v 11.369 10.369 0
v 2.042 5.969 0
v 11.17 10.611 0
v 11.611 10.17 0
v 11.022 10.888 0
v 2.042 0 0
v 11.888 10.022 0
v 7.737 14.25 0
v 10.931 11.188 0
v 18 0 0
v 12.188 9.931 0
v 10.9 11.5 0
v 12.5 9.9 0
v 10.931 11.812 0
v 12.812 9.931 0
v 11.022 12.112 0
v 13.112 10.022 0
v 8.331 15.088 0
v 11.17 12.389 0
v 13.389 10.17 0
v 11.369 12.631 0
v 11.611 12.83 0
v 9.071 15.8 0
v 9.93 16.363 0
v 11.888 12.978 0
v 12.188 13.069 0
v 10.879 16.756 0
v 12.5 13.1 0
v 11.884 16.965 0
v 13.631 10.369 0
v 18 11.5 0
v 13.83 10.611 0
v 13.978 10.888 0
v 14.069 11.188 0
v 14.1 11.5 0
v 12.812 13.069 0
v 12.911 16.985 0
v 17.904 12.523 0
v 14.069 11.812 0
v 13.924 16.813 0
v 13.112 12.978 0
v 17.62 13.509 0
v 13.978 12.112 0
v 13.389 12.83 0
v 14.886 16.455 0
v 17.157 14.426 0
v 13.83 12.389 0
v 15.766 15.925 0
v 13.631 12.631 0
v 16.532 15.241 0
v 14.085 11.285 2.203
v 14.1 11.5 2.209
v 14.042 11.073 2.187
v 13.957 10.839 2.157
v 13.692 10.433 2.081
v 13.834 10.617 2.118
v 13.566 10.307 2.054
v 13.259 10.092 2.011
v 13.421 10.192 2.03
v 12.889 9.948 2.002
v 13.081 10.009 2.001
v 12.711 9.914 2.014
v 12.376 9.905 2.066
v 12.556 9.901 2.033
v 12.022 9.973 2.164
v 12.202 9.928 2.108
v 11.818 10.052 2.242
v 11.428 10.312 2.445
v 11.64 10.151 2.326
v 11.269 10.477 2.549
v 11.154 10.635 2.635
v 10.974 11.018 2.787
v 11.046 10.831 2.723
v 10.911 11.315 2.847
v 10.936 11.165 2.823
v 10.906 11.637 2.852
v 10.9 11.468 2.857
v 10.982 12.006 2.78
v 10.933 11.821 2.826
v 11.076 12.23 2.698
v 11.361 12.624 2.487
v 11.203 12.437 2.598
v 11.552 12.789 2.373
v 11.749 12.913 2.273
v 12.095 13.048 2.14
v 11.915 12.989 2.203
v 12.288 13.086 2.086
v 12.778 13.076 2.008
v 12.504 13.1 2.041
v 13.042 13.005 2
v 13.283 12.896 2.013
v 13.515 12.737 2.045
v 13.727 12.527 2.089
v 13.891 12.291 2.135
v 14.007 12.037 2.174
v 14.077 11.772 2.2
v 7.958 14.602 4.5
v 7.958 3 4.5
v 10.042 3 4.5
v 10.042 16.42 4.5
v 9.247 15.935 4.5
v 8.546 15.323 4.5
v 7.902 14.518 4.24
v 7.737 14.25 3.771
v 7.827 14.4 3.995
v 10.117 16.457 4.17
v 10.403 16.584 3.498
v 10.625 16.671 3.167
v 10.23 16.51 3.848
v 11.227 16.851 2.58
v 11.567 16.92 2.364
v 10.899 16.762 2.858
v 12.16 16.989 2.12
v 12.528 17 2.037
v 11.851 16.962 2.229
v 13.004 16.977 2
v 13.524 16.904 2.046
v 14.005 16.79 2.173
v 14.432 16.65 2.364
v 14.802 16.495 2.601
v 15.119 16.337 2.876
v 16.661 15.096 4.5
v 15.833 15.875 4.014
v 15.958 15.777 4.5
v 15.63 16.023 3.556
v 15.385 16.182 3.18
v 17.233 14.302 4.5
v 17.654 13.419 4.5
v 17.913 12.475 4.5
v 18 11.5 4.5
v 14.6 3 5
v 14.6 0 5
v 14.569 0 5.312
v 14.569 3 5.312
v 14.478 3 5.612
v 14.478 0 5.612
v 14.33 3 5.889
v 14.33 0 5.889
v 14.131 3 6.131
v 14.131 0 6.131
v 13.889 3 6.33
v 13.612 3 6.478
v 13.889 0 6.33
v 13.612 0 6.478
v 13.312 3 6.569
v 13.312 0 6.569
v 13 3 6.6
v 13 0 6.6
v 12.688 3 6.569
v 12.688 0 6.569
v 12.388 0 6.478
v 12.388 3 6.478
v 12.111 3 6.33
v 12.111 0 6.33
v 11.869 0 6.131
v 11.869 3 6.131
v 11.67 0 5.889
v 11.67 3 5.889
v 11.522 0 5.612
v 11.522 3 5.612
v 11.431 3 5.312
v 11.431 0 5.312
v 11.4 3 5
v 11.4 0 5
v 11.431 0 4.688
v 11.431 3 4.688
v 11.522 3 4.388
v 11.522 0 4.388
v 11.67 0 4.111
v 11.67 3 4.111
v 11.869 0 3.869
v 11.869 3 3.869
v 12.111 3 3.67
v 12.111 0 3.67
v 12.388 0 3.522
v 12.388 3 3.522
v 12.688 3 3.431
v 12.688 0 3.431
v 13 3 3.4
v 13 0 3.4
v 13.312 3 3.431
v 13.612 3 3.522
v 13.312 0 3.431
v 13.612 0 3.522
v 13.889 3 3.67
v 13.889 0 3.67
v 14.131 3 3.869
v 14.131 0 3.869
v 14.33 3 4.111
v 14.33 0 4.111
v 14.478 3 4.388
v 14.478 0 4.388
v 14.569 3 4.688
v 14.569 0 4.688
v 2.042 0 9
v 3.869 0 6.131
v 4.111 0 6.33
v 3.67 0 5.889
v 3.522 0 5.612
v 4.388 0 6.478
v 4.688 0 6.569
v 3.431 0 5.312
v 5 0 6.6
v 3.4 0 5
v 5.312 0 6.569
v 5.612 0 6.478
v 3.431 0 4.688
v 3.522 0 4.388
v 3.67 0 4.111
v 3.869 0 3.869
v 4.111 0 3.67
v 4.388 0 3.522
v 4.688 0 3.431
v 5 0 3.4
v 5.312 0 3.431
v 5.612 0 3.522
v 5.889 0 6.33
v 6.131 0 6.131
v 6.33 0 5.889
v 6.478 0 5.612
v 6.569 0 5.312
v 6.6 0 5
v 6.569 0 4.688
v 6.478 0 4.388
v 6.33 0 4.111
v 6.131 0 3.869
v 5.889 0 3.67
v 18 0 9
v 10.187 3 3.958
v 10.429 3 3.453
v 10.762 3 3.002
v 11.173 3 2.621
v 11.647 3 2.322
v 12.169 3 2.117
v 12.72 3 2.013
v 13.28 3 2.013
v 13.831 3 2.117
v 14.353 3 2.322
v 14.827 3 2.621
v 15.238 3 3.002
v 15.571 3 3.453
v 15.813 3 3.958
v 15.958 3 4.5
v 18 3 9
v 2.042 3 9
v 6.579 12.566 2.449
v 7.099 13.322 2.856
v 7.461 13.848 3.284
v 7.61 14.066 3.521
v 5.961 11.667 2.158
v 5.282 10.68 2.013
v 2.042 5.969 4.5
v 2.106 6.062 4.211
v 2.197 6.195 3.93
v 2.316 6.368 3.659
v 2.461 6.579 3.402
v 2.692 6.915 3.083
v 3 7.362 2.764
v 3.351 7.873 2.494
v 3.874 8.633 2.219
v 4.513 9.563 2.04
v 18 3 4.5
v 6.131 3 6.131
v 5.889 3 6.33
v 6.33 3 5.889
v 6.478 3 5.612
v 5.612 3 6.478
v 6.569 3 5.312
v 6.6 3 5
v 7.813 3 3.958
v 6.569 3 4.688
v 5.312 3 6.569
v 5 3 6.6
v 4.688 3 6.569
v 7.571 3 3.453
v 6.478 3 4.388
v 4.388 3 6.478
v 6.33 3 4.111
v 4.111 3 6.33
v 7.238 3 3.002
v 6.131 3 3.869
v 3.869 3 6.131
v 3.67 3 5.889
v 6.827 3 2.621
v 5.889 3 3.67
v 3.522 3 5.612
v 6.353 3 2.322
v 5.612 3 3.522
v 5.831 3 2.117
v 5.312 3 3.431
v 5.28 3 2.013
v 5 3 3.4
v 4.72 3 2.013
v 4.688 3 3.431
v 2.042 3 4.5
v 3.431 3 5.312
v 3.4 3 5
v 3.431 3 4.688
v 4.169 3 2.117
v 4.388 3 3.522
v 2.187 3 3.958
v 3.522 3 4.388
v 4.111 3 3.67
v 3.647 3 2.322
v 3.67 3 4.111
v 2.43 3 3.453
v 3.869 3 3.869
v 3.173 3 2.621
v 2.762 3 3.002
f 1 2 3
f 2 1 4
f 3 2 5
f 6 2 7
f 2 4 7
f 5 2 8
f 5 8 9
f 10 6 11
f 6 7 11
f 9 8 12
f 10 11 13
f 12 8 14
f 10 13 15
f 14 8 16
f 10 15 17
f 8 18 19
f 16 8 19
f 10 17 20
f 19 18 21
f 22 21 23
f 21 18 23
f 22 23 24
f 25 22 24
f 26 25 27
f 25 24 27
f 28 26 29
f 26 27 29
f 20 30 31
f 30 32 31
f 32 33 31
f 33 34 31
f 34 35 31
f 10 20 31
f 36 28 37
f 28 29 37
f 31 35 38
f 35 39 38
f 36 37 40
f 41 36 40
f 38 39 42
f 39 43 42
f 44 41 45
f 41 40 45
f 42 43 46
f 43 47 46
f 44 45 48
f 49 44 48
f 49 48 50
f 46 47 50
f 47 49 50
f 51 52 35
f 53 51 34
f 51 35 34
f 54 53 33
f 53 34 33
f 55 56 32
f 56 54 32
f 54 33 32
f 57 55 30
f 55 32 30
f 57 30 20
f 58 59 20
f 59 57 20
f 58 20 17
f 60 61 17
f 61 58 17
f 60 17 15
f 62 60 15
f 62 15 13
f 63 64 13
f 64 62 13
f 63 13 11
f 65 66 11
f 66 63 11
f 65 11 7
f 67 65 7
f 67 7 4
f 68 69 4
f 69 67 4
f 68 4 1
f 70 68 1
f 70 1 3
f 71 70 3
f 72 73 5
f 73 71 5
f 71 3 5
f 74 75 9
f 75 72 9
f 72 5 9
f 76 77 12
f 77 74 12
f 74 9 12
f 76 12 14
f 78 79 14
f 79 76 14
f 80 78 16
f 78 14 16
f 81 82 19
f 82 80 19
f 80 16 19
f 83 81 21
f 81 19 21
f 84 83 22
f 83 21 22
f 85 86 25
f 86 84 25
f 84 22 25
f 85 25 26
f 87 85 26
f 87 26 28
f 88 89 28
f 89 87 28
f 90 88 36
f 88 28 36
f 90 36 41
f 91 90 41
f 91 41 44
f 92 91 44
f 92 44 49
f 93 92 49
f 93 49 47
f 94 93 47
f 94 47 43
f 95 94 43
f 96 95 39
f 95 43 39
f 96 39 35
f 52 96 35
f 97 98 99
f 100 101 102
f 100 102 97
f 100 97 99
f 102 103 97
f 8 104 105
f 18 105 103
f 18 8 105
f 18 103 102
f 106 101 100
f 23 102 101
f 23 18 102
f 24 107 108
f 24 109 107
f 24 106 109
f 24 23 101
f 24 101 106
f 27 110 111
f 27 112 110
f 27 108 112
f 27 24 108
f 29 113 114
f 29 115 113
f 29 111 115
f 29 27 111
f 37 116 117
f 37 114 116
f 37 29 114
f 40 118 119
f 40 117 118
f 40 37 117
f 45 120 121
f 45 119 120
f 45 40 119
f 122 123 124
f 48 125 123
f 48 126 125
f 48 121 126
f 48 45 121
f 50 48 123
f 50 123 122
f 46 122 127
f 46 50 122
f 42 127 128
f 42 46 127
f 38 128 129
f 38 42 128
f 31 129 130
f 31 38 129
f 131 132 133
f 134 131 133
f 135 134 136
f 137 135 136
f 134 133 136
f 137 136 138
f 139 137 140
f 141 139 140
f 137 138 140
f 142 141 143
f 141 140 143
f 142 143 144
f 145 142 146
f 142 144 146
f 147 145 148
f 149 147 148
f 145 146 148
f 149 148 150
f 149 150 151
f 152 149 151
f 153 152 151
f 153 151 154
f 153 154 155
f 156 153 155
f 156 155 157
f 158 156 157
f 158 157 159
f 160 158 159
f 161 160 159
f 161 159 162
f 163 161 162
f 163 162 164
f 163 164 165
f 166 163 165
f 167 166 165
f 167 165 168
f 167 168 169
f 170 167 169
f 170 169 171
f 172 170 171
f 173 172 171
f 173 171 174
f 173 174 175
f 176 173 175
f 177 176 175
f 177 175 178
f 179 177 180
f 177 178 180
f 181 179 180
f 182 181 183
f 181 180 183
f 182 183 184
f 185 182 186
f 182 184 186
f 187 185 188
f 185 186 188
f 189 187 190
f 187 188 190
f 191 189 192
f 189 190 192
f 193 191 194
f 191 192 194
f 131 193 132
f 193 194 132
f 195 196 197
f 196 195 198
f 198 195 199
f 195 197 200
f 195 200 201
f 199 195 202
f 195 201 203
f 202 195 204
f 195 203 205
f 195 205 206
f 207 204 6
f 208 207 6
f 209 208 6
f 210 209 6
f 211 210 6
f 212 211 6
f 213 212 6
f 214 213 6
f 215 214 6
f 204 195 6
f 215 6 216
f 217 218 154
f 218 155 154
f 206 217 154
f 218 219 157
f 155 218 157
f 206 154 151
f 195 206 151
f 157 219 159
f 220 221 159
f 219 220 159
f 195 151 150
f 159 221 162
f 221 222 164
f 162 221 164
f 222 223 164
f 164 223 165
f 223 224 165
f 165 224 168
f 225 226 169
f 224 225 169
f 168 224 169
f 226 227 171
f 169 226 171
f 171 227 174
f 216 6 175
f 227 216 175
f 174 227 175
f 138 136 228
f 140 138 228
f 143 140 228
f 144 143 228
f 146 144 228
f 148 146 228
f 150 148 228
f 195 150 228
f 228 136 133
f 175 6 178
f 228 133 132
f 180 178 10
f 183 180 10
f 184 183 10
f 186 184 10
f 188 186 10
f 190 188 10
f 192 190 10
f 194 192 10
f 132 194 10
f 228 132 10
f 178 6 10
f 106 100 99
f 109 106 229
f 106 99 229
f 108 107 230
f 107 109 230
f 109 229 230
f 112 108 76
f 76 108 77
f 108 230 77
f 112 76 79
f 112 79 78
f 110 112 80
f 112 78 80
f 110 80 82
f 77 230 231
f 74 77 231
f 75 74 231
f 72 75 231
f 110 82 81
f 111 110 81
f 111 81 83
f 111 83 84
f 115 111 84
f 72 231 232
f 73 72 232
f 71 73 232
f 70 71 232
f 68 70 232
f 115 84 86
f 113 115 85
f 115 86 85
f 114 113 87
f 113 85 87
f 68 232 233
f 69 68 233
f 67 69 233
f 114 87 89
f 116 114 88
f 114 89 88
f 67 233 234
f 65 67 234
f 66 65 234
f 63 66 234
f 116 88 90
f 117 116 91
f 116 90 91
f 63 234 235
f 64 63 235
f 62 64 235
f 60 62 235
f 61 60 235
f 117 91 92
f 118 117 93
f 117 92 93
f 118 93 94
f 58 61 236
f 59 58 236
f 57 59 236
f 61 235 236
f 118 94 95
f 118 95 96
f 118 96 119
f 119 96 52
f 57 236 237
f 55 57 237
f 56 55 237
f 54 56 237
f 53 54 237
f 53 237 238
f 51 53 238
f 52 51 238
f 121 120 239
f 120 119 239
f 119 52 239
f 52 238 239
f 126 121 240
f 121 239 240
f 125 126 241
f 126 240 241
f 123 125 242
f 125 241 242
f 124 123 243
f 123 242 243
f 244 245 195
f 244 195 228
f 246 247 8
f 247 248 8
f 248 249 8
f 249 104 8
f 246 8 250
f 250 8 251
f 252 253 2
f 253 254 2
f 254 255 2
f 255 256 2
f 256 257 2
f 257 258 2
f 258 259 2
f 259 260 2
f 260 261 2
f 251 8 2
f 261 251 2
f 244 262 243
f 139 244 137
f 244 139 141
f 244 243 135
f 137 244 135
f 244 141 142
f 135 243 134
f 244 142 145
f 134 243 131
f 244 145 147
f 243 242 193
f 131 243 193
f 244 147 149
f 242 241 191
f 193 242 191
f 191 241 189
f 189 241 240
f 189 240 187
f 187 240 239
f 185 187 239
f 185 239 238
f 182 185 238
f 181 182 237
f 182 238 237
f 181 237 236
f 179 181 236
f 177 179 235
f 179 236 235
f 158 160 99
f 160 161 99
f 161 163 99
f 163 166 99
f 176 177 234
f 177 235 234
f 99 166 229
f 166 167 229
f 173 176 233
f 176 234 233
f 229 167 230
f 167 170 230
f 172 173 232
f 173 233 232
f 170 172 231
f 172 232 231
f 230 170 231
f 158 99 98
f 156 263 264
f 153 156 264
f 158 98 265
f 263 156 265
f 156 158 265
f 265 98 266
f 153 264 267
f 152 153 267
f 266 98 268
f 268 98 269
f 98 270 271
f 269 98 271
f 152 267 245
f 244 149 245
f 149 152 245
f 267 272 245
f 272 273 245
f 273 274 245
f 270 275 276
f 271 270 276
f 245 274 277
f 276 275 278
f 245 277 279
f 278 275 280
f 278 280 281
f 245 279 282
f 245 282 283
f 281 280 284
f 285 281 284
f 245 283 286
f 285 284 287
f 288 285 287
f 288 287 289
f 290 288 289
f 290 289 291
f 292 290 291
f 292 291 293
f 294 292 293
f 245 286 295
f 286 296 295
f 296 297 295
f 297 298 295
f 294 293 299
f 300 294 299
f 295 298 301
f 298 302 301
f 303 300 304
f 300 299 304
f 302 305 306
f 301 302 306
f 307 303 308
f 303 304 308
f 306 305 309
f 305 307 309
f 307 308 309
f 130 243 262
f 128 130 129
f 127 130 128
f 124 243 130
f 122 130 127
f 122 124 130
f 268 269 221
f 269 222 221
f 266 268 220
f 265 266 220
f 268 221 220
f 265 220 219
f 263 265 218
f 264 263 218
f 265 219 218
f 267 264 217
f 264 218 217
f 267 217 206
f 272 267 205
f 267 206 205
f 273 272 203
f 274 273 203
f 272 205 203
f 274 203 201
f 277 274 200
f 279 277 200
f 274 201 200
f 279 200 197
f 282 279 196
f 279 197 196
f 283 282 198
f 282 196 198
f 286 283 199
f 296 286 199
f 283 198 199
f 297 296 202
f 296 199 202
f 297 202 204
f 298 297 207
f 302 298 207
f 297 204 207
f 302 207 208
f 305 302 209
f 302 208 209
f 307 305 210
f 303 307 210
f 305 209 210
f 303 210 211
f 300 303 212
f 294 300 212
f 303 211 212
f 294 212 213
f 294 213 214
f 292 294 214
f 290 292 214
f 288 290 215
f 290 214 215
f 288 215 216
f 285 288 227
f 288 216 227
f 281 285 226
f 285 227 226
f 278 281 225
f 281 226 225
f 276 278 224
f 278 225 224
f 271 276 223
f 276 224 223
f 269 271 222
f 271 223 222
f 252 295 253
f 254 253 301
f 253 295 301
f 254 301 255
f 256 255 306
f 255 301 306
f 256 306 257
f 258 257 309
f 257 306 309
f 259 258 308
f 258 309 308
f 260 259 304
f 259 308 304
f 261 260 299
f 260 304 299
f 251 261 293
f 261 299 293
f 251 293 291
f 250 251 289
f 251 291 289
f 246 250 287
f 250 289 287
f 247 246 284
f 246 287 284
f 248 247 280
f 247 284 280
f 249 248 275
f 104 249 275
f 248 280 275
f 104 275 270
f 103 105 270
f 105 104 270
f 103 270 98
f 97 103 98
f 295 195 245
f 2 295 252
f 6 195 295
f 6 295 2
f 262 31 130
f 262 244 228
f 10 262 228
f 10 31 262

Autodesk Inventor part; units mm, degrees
ref_plane "YZ Plane" through (0, 0, 0) normal (1, 0, 0) x (0, 1, 0)
ref_plane "XZ Plane" through (0, 0, 0) normal (0, 1, 0) x (-1, 0, 0)
ref_plane "XY Plane" through (0, 0, 0) normal (0, 0, 1) x (1, 0, 0)
sketch "Sketch1" plane through (0, 0, 0) normal (0, 0, 1) x (1, 0, 0)
  circle A0 centre (12.5, 11.5) radius 1.6
  line L0 (0, 0) -> (18, 0)
  line L1 (0, 0) -> (0, 3)
  arc A1 (18, 11.5) -> (7.7369, 14.25) centre (12.5, 11.5) ccw
  line L2 (12.5, 11.5) -> (7.7369, 14.25) construction
  line L3 (12.5, 11.5) -> (18, 11.5) construction
  line L4 (7.7369, 14.25) -> (0, 3)
  line L5 (18, 11.5) -> (18, 0)
  dimension "d17" = 3
  dimension "d19" = 11.5
  dimension "d23" = 90
  dimension "d25" = 12.5
  dimension "d31" = 5.5
  dimension "d32" = 150
  dimension "d49" = 3.2
extrude "Extrusion1" add sketch "Sketch1" along normal blind 4.5
sketch "Sketch4" plane through (0, 0, 4.5) normal (0, 0, 1) x (1, 0, 0)
  line L0 (0, 3) -> (0, 0) projected
  line L1 (18, 0) -> (18, 3)
  line L2 (0, 0) -> (18, 0)
  line L3 (18, 0) -> (18, 3)
  line L4 (18, 3) -> (0, 3)
  line L5 (0, 3) -> (0, 0)
  line L6 (18, 0) -> (18, 11.5) projected
extrude "Extrusion2" add sketch "Sketch4" along normal blind 4.5
sketch "Sketch5" plane through (0, 0, 0) normal (0, -1, 0) x (1, 0, 0)
  circle A0 centre (5, 5) radius 1.6
  circle A1 centre (13, 5) radius 1.6
  line L0 (0, 0) -> (18, 0) projected
  point P0 (20.0001, 0)
  dimension "d13" = 3.2
  dimension "d14" = 3.2
  dimension "d38" = 5
  dimension "d39" = 5
  dimension "d50" = 8
extrude "Extrusion3" cut sketch "Sketch5" against normal through all
sketch "Sketch6" plane through (0, 3, 9) normal (0, 1, 0) x (1, 0, 0)
  circle A0 centre (5, 4) radius 1.6 projected
  circle A1 centre (5, 4) radius 3
  circle A2 centre (13, 4) radius 1.6 projected
  circle A3 centre (13, 4) radius 3
  line L0 (0, 9) -> (18, 9) projected
  point P0 (20.0001, 9)
  dimension "d34" = 6
  dimension "d35" = 6
  dimension "d40" = 5
  dimension "d41" = 5
extrude "Extrusion4" cut sketch "Sketch6" along normal up to next
sketch "Sketch7" plane through (0, 0, 0) normal (0, -1, 0) x (1, 0, 0)
  line L0 (0, 0) -> (0, 9) projected
  line L1 (2.042, 0) -> (0, 0)
  line L2 (0, 0) -> (0, 9)
  line L3 (0, 9) -> (2.042, 9)
  line L4 (2.042, 9) -> (2.042, 0)
extrude "Extrusion5" cut sketch "Sketch7" against normal up to next
properties part number "lower_deck_shaft_mount_v4_for_AD"
